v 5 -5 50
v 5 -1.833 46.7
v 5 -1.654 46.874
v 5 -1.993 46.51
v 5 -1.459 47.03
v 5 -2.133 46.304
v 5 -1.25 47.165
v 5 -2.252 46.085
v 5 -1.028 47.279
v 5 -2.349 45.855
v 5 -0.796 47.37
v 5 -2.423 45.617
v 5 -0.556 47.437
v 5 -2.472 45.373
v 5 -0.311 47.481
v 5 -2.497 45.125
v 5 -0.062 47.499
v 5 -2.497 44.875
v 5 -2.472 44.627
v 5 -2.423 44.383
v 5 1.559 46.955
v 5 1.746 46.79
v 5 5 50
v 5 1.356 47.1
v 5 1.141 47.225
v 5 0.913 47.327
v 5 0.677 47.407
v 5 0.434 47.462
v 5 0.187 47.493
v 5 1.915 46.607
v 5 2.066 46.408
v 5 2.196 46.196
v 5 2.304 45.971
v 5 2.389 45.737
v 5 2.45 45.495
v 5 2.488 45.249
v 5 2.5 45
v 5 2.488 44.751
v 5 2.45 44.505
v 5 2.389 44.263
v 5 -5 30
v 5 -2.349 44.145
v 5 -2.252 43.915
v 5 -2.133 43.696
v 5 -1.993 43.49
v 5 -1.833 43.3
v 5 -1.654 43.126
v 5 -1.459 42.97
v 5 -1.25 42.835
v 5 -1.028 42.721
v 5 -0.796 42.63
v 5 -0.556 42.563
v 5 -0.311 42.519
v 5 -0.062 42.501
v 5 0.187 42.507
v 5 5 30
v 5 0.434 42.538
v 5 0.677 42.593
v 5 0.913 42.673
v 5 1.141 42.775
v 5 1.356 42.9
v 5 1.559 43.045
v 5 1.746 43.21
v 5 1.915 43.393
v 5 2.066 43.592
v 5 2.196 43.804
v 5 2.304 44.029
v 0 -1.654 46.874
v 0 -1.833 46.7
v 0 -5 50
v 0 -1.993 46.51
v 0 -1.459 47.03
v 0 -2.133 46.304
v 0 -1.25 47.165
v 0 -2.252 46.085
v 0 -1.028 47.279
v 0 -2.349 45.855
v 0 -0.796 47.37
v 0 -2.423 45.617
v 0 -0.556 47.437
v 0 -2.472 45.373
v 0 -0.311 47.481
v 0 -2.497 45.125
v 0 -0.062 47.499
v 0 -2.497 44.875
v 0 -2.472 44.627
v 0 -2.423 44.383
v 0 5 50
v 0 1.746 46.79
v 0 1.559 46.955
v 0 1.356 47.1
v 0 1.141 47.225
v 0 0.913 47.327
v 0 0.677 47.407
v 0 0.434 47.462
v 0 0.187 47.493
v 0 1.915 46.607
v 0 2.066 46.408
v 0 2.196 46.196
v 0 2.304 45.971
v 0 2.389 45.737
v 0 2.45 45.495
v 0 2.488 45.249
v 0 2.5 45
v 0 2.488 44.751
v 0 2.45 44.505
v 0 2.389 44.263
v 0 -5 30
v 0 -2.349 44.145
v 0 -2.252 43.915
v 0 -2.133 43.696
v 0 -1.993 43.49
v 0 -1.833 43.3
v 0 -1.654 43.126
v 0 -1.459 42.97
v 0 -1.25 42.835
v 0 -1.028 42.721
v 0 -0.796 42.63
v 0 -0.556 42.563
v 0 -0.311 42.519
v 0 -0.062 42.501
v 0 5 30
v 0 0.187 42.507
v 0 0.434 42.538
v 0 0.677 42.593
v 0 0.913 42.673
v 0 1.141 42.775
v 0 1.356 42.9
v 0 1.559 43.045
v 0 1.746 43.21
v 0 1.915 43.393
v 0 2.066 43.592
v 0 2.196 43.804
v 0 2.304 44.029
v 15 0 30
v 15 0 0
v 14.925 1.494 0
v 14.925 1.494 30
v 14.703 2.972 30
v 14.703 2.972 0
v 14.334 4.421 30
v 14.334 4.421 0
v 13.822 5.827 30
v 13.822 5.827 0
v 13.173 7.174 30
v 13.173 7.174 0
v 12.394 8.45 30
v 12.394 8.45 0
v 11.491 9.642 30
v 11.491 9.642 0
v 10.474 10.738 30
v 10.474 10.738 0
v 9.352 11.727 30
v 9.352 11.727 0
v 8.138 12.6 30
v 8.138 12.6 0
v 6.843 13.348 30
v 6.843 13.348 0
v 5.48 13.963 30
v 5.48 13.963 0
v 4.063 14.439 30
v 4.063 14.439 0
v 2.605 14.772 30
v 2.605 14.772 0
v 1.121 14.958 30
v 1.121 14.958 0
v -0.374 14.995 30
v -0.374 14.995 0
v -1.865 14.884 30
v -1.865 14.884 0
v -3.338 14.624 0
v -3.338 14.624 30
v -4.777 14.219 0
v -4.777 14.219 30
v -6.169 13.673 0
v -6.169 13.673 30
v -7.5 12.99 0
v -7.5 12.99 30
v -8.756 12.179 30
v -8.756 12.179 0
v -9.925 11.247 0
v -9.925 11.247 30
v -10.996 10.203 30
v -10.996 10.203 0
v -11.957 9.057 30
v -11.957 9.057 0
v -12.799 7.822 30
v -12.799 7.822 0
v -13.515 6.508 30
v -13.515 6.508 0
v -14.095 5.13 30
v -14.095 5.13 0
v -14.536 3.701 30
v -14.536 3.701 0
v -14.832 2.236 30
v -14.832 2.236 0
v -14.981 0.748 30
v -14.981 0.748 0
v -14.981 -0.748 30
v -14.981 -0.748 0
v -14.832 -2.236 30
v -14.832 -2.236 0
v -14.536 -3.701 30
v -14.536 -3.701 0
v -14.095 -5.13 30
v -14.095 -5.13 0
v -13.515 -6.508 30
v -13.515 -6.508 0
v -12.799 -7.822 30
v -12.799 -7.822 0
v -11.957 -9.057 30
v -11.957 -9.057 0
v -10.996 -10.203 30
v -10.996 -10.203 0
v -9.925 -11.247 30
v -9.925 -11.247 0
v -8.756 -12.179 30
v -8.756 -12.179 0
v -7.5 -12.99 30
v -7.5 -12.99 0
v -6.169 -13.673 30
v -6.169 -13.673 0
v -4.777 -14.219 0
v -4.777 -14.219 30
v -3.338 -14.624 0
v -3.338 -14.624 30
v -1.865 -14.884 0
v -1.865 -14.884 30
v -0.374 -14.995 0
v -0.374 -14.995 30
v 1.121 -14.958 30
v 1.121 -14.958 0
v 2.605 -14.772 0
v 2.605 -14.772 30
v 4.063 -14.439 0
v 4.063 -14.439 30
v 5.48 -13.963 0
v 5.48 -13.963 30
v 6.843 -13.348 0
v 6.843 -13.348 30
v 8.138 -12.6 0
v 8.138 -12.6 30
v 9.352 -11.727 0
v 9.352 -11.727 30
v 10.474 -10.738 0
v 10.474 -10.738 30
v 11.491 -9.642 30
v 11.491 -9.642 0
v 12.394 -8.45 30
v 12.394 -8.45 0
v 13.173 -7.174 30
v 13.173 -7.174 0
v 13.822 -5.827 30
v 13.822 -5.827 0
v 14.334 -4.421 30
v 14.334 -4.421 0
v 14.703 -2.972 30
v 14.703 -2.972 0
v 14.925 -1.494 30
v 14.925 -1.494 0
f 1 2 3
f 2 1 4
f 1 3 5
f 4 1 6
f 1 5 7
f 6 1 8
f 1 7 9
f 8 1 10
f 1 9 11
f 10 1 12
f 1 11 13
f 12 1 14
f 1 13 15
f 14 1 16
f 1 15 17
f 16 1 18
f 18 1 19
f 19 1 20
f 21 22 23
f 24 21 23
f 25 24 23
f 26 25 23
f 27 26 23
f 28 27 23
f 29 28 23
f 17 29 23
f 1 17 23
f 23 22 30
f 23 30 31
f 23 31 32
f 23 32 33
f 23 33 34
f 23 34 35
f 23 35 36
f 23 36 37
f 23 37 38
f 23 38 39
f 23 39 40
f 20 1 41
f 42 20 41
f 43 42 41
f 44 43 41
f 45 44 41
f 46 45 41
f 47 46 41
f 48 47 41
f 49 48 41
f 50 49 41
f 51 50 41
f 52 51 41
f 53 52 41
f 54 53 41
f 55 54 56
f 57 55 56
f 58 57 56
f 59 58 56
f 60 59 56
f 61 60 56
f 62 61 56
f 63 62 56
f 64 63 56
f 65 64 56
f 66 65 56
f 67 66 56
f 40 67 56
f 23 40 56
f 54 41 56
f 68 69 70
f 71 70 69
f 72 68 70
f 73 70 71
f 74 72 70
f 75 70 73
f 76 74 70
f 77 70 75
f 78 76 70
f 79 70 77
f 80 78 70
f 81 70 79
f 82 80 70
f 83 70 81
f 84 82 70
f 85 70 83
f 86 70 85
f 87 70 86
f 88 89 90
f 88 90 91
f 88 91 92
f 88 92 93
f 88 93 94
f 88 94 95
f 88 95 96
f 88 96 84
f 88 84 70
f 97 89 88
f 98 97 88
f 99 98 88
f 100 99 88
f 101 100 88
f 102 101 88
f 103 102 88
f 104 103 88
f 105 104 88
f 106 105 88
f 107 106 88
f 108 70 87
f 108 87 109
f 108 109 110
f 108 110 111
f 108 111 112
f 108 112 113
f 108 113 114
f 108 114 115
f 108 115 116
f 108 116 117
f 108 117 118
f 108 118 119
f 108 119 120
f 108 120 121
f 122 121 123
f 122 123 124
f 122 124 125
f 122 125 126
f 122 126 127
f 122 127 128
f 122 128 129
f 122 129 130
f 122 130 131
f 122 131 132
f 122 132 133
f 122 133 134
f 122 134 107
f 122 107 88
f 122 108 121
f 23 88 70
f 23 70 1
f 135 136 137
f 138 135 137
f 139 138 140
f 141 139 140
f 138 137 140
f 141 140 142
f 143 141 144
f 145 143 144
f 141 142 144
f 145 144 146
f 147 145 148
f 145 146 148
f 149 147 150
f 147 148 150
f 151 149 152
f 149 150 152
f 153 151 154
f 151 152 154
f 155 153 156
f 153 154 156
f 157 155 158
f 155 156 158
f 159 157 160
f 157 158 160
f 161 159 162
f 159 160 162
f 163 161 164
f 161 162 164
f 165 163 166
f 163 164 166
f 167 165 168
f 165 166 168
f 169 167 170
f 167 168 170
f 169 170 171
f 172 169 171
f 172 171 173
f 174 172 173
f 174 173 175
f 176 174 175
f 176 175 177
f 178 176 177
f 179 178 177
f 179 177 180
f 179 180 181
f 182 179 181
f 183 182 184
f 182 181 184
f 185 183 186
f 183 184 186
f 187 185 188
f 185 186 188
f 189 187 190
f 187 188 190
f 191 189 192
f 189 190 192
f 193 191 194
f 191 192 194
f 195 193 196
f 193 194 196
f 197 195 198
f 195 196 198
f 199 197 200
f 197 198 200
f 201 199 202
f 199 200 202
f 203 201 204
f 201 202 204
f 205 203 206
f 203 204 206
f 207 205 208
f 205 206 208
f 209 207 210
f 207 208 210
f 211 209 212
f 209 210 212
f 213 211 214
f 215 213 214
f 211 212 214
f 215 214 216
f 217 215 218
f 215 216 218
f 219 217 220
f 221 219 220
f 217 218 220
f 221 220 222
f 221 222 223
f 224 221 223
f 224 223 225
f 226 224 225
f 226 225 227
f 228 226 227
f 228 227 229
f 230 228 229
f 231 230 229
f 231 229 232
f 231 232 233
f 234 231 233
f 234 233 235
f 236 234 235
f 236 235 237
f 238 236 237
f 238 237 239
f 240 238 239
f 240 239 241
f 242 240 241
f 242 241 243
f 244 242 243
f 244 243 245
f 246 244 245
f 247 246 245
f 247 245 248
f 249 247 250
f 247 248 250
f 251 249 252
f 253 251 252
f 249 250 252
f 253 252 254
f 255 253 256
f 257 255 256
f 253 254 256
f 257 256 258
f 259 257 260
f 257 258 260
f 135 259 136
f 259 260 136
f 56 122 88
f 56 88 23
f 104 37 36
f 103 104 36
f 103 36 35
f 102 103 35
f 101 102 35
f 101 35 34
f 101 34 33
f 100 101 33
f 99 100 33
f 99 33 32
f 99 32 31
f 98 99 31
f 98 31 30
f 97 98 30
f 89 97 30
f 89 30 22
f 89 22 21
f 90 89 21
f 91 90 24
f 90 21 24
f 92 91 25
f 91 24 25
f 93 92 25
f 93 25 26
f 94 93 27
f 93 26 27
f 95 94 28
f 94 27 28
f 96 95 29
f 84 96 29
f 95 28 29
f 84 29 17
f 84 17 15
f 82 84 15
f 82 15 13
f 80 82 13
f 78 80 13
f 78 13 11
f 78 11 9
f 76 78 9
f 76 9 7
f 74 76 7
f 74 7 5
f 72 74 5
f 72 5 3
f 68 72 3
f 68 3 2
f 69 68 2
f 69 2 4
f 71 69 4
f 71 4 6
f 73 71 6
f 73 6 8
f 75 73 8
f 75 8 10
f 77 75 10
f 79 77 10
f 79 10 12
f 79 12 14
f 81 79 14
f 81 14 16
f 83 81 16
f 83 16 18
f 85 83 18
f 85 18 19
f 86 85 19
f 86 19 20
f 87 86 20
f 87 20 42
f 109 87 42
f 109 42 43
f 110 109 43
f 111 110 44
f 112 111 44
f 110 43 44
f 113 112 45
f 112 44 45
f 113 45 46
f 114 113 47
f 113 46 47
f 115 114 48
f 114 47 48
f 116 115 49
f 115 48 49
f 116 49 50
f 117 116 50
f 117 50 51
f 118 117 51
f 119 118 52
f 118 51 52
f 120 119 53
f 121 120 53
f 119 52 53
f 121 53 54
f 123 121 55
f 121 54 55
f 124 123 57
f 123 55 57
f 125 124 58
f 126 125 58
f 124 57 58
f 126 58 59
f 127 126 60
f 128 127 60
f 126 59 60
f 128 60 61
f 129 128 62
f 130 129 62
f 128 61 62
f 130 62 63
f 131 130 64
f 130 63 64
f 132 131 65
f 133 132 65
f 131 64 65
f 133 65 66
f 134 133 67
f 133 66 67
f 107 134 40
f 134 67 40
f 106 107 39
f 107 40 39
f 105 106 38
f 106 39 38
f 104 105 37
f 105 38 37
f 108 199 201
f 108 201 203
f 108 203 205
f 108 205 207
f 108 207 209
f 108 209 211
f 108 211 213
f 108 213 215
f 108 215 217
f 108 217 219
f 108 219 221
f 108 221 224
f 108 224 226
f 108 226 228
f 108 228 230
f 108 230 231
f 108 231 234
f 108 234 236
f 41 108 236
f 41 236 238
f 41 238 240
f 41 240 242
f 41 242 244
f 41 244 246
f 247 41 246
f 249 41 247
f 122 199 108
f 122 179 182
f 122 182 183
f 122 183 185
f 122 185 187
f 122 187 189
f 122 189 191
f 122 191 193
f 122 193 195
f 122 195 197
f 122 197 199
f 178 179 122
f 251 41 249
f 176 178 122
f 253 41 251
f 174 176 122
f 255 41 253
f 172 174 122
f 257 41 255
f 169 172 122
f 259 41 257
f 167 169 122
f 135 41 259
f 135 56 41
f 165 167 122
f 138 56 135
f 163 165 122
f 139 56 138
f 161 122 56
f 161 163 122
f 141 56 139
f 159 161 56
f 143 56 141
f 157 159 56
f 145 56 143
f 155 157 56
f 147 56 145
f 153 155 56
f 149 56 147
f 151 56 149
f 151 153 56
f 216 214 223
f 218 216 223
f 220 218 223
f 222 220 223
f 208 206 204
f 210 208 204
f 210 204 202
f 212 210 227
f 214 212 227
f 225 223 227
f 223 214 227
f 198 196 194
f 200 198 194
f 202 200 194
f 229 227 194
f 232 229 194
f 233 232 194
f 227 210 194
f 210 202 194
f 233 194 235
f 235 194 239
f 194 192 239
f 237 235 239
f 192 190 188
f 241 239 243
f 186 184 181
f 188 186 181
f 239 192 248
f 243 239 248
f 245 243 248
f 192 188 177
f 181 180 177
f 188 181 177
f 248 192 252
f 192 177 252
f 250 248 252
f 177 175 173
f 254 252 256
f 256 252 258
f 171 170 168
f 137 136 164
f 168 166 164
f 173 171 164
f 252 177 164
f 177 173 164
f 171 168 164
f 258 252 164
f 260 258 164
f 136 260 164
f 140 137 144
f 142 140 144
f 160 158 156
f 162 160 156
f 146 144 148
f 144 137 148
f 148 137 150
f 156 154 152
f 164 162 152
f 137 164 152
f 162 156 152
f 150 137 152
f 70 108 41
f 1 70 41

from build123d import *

# Parameters (mm, degrees)
SKETCH003_R  = 15
PAD003_DEPTH = 30
SKETCH004_W  = 5
SKETCH004_H  = 10
PAD004_DEPTH = 20
SKETCH005_R  = 2.5
POCKET_DEPTH = 20.001


with BuildPart() as part:
    # Sketch003 → Pad003 (new body)
    with BuildSketch(Plane.XY):
        Circle(SKETCH003_R)
    extrude(amount=PAD003_DEPTH)

    # Sketch004 (on Face3 of Pad003) → Pad004 (join)
    with BuildSketch(Plane.XY.offset(30)):
        with Locations((2.5, 0)):
            Rectangle(SKETCH004_W, SKETCH004_H)
    extrude(amount=PAD004_DEPTH)

    # Sketch005 (on Face6 of Pad004) → Pocket (cut, through all)
    with BuildSketch(Plane.YZ.offset(5)):
        with Locations((0, 45)):
            Circle(SKETCH005_R)
    extrude(amount=-POCKET_DEPTH, mode=Mode.SUBTRACT)


solid = part.part
